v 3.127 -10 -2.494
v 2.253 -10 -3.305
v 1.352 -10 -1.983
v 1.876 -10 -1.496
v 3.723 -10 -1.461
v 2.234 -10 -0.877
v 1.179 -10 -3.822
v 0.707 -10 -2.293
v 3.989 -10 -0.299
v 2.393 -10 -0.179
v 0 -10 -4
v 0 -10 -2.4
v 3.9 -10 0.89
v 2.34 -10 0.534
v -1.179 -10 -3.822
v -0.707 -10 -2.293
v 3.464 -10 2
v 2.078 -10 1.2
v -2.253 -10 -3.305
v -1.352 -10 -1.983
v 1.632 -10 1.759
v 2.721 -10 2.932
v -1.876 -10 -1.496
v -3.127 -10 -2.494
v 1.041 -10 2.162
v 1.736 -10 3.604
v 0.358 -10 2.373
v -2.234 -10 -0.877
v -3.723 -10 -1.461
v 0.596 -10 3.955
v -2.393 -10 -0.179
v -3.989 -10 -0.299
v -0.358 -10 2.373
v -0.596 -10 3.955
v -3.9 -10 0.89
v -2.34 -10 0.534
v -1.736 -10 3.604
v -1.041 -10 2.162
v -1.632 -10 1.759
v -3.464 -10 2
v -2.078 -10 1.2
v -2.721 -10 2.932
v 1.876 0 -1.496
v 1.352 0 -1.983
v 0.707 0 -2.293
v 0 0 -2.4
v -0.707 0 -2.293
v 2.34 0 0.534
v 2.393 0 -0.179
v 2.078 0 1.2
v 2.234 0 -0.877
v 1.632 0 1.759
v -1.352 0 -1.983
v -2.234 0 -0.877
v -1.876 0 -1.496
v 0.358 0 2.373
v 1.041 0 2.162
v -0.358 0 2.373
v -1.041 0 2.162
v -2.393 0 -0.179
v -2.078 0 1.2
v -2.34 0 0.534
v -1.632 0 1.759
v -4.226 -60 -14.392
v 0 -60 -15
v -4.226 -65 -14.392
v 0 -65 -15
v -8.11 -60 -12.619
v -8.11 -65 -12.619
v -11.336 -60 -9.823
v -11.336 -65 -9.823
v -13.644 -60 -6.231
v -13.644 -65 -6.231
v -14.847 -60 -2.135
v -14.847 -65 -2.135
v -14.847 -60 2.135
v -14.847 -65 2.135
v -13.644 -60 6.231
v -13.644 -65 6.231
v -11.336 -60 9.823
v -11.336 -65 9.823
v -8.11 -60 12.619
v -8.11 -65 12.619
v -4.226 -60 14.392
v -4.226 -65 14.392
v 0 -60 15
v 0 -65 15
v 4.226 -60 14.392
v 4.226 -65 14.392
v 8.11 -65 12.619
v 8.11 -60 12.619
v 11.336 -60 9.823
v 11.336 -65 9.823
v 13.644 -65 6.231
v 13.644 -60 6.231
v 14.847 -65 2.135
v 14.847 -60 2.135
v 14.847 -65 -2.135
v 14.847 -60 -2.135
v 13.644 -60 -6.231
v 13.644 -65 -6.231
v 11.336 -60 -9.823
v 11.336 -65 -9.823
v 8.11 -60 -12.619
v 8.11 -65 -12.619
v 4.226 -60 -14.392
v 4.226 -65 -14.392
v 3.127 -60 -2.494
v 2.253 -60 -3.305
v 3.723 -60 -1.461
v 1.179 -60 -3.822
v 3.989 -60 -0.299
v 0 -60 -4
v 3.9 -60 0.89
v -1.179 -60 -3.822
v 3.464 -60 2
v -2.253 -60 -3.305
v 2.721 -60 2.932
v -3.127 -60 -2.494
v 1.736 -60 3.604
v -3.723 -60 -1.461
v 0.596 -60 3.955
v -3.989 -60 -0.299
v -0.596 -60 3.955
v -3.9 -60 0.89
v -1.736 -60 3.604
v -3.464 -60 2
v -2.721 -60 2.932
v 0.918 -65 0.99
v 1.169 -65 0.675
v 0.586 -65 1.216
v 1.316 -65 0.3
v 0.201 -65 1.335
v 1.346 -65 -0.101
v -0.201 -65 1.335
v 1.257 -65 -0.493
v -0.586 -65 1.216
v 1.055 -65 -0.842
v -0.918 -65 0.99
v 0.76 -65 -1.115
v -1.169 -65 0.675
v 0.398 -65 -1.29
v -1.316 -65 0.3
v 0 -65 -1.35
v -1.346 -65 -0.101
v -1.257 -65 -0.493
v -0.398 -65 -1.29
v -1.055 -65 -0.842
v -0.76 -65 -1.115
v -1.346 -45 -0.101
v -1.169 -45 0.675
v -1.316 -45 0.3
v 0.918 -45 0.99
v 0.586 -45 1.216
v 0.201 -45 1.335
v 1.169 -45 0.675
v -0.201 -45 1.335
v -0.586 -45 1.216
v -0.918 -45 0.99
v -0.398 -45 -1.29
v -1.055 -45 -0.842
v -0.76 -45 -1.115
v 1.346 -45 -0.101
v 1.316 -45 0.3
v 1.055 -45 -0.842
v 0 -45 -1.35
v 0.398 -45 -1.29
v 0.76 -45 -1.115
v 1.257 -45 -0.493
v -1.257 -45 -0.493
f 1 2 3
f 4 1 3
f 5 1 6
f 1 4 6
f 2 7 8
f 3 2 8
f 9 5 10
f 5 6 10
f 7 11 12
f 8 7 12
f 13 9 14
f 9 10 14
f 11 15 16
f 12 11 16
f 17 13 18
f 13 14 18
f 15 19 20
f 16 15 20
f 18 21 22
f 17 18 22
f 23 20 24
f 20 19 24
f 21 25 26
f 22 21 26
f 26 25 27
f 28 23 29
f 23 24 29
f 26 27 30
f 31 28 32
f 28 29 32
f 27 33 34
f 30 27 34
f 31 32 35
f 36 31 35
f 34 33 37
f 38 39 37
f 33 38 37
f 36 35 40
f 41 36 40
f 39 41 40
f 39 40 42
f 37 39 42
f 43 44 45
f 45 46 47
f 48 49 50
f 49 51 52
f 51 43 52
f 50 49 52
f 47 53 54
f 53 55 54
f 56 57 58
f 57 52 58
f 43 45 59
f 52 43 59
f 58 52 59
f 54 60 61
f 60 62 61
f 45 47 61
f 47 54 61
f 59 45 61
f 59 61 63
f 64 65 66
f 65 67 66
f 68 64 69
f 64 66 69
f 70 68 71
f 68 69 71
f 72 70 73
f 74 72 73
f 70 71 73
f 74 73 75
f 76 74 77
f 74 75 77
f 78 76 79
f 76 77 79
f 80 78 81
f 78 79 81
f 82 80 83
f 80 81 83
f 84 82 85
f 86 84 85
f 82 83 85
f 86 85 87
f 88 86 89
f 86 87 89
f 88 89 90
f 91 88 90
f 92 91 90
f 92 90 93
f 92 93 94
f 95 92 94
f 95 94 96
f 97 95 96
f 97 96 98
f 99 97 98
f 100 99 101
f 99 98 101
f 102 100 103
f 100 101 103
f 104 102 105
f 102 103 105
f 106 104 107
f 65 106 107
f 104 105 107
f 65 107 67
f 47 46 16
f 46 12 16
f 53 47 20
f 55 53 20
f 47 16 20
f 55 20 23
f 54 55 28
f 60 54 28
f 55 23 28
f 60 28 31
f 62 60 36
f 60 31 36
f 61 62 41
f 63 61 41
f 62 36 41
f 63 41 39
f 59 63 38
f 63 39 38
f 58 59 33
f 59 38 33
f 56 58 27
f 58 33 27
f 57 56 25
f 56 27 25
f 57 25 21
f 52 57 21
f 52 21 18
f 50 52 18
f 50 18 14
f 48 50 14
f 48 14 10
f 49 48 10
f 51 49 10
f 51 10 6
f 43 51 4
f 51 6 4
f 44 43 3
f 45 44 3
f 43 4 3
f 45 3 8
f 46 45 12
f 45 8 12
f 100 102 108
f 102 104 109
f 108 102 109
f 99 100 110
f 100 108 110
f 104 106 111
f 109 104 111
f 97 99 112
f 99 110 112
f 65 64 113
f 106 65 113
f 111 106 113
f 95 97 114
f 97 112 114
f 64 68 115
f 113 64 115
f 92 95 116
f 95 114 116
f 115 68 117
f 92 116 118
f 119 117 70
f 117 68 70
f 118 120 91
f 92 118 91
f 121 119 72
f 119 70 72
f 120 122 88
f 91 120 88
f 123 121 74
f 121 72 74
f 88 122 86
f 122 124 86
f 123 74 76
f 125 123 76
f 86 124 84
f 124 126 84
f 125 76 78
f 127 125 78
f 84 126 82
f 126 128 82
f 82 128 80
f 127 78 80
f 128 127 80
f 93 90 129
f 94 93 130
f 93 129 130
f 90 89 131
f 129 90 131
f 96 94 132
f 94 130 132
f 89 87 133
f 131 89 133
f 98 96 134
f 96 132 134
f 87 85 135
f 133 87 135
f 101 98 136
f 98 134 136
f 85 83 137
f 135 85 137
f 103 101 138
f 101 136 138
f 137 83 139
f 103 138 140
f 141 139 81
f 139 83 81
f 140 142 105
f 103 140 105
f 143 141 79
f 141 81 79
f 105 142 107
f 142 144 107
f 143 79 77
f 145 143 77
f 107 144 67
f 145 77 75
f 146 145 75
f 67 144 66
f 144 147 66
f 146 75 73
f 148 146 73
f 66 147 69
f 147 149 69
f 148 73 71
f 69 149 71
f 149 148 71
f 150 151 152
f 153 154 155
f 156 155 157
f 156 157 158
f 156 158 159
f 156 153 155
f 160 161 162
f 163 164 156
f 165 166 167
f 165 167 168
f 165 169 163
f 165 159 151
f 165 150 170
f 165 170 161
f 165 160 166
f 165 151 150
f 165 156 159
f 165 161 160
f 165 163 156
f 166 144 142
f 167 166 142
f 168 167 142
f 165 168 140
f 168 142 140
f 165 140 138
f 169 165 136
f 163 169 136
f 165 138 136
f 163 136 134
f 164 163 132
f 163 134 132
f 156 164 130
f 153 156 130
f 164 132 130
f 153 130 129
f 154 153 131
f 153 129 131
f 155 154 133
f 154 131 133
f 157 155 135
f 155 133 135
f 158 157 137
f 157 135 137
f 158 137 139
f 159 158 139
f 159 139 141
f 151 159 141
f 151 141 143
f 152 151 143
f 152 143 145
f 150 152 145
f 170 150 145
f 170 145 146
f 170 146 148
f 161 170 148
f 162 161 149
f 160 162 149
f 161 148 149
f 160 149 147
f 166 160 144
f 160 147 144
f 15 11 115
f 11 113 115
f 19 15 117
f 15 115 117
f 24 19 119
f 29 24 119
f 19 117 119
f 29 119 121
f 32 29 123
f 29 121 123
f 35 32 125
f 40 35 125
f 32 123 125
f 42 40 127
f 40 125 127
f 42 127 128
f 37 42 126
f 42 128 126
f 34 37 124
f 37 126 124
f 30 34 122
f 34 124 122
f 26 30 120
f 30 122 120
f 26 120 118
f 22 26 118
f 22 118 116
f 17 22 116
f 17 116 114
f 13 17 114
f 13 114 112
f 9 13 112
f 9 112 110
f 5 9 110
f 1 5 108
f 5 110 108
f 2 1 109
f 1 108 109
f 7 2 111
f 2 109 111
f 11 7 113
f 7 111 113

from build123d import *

# Parameters (mm, degrees)
CROQUIS2_R            = 1.35
CORTAR_EXTRUIR1_DEPTH = 20


with BuildPart() as part:
    # Croquis1 → Revolución1 (revolve)
    with BuildSketch(Plane(origin=(0, 0, 0), x_dir=(0, 0, -1), z_dir=(1, 0, 0)), mode=Mode.PRIVATE) as revoluci_n1_sk:
        Polygon((0, 0), (-2.4, 0), (-2.4, -10), (-4, -10), (-4, -60), (-15, -60), (-15, -65), (0, -65), align=None)
    revolve(revoluci_n1_sk.sketch.rotate(Axis((0, -65, 0), (0, 1, 0)), 180), axis=Axis((0, -65, 0), (0, 1, 0)))

    # Croquis2 → Cortar-Extruir1 (cut)
    with BuildSketch(Plane.XZ.offset(65)):
        with Locations(Location((0, 0, 0), (0, 0, 270))):
            Circle(CROQUIS2_R)
    extrude(amount=-CORTAR_EXTRUIR1_DEPTH, mode=Mode.SUBTRACT)


solid = part.part
